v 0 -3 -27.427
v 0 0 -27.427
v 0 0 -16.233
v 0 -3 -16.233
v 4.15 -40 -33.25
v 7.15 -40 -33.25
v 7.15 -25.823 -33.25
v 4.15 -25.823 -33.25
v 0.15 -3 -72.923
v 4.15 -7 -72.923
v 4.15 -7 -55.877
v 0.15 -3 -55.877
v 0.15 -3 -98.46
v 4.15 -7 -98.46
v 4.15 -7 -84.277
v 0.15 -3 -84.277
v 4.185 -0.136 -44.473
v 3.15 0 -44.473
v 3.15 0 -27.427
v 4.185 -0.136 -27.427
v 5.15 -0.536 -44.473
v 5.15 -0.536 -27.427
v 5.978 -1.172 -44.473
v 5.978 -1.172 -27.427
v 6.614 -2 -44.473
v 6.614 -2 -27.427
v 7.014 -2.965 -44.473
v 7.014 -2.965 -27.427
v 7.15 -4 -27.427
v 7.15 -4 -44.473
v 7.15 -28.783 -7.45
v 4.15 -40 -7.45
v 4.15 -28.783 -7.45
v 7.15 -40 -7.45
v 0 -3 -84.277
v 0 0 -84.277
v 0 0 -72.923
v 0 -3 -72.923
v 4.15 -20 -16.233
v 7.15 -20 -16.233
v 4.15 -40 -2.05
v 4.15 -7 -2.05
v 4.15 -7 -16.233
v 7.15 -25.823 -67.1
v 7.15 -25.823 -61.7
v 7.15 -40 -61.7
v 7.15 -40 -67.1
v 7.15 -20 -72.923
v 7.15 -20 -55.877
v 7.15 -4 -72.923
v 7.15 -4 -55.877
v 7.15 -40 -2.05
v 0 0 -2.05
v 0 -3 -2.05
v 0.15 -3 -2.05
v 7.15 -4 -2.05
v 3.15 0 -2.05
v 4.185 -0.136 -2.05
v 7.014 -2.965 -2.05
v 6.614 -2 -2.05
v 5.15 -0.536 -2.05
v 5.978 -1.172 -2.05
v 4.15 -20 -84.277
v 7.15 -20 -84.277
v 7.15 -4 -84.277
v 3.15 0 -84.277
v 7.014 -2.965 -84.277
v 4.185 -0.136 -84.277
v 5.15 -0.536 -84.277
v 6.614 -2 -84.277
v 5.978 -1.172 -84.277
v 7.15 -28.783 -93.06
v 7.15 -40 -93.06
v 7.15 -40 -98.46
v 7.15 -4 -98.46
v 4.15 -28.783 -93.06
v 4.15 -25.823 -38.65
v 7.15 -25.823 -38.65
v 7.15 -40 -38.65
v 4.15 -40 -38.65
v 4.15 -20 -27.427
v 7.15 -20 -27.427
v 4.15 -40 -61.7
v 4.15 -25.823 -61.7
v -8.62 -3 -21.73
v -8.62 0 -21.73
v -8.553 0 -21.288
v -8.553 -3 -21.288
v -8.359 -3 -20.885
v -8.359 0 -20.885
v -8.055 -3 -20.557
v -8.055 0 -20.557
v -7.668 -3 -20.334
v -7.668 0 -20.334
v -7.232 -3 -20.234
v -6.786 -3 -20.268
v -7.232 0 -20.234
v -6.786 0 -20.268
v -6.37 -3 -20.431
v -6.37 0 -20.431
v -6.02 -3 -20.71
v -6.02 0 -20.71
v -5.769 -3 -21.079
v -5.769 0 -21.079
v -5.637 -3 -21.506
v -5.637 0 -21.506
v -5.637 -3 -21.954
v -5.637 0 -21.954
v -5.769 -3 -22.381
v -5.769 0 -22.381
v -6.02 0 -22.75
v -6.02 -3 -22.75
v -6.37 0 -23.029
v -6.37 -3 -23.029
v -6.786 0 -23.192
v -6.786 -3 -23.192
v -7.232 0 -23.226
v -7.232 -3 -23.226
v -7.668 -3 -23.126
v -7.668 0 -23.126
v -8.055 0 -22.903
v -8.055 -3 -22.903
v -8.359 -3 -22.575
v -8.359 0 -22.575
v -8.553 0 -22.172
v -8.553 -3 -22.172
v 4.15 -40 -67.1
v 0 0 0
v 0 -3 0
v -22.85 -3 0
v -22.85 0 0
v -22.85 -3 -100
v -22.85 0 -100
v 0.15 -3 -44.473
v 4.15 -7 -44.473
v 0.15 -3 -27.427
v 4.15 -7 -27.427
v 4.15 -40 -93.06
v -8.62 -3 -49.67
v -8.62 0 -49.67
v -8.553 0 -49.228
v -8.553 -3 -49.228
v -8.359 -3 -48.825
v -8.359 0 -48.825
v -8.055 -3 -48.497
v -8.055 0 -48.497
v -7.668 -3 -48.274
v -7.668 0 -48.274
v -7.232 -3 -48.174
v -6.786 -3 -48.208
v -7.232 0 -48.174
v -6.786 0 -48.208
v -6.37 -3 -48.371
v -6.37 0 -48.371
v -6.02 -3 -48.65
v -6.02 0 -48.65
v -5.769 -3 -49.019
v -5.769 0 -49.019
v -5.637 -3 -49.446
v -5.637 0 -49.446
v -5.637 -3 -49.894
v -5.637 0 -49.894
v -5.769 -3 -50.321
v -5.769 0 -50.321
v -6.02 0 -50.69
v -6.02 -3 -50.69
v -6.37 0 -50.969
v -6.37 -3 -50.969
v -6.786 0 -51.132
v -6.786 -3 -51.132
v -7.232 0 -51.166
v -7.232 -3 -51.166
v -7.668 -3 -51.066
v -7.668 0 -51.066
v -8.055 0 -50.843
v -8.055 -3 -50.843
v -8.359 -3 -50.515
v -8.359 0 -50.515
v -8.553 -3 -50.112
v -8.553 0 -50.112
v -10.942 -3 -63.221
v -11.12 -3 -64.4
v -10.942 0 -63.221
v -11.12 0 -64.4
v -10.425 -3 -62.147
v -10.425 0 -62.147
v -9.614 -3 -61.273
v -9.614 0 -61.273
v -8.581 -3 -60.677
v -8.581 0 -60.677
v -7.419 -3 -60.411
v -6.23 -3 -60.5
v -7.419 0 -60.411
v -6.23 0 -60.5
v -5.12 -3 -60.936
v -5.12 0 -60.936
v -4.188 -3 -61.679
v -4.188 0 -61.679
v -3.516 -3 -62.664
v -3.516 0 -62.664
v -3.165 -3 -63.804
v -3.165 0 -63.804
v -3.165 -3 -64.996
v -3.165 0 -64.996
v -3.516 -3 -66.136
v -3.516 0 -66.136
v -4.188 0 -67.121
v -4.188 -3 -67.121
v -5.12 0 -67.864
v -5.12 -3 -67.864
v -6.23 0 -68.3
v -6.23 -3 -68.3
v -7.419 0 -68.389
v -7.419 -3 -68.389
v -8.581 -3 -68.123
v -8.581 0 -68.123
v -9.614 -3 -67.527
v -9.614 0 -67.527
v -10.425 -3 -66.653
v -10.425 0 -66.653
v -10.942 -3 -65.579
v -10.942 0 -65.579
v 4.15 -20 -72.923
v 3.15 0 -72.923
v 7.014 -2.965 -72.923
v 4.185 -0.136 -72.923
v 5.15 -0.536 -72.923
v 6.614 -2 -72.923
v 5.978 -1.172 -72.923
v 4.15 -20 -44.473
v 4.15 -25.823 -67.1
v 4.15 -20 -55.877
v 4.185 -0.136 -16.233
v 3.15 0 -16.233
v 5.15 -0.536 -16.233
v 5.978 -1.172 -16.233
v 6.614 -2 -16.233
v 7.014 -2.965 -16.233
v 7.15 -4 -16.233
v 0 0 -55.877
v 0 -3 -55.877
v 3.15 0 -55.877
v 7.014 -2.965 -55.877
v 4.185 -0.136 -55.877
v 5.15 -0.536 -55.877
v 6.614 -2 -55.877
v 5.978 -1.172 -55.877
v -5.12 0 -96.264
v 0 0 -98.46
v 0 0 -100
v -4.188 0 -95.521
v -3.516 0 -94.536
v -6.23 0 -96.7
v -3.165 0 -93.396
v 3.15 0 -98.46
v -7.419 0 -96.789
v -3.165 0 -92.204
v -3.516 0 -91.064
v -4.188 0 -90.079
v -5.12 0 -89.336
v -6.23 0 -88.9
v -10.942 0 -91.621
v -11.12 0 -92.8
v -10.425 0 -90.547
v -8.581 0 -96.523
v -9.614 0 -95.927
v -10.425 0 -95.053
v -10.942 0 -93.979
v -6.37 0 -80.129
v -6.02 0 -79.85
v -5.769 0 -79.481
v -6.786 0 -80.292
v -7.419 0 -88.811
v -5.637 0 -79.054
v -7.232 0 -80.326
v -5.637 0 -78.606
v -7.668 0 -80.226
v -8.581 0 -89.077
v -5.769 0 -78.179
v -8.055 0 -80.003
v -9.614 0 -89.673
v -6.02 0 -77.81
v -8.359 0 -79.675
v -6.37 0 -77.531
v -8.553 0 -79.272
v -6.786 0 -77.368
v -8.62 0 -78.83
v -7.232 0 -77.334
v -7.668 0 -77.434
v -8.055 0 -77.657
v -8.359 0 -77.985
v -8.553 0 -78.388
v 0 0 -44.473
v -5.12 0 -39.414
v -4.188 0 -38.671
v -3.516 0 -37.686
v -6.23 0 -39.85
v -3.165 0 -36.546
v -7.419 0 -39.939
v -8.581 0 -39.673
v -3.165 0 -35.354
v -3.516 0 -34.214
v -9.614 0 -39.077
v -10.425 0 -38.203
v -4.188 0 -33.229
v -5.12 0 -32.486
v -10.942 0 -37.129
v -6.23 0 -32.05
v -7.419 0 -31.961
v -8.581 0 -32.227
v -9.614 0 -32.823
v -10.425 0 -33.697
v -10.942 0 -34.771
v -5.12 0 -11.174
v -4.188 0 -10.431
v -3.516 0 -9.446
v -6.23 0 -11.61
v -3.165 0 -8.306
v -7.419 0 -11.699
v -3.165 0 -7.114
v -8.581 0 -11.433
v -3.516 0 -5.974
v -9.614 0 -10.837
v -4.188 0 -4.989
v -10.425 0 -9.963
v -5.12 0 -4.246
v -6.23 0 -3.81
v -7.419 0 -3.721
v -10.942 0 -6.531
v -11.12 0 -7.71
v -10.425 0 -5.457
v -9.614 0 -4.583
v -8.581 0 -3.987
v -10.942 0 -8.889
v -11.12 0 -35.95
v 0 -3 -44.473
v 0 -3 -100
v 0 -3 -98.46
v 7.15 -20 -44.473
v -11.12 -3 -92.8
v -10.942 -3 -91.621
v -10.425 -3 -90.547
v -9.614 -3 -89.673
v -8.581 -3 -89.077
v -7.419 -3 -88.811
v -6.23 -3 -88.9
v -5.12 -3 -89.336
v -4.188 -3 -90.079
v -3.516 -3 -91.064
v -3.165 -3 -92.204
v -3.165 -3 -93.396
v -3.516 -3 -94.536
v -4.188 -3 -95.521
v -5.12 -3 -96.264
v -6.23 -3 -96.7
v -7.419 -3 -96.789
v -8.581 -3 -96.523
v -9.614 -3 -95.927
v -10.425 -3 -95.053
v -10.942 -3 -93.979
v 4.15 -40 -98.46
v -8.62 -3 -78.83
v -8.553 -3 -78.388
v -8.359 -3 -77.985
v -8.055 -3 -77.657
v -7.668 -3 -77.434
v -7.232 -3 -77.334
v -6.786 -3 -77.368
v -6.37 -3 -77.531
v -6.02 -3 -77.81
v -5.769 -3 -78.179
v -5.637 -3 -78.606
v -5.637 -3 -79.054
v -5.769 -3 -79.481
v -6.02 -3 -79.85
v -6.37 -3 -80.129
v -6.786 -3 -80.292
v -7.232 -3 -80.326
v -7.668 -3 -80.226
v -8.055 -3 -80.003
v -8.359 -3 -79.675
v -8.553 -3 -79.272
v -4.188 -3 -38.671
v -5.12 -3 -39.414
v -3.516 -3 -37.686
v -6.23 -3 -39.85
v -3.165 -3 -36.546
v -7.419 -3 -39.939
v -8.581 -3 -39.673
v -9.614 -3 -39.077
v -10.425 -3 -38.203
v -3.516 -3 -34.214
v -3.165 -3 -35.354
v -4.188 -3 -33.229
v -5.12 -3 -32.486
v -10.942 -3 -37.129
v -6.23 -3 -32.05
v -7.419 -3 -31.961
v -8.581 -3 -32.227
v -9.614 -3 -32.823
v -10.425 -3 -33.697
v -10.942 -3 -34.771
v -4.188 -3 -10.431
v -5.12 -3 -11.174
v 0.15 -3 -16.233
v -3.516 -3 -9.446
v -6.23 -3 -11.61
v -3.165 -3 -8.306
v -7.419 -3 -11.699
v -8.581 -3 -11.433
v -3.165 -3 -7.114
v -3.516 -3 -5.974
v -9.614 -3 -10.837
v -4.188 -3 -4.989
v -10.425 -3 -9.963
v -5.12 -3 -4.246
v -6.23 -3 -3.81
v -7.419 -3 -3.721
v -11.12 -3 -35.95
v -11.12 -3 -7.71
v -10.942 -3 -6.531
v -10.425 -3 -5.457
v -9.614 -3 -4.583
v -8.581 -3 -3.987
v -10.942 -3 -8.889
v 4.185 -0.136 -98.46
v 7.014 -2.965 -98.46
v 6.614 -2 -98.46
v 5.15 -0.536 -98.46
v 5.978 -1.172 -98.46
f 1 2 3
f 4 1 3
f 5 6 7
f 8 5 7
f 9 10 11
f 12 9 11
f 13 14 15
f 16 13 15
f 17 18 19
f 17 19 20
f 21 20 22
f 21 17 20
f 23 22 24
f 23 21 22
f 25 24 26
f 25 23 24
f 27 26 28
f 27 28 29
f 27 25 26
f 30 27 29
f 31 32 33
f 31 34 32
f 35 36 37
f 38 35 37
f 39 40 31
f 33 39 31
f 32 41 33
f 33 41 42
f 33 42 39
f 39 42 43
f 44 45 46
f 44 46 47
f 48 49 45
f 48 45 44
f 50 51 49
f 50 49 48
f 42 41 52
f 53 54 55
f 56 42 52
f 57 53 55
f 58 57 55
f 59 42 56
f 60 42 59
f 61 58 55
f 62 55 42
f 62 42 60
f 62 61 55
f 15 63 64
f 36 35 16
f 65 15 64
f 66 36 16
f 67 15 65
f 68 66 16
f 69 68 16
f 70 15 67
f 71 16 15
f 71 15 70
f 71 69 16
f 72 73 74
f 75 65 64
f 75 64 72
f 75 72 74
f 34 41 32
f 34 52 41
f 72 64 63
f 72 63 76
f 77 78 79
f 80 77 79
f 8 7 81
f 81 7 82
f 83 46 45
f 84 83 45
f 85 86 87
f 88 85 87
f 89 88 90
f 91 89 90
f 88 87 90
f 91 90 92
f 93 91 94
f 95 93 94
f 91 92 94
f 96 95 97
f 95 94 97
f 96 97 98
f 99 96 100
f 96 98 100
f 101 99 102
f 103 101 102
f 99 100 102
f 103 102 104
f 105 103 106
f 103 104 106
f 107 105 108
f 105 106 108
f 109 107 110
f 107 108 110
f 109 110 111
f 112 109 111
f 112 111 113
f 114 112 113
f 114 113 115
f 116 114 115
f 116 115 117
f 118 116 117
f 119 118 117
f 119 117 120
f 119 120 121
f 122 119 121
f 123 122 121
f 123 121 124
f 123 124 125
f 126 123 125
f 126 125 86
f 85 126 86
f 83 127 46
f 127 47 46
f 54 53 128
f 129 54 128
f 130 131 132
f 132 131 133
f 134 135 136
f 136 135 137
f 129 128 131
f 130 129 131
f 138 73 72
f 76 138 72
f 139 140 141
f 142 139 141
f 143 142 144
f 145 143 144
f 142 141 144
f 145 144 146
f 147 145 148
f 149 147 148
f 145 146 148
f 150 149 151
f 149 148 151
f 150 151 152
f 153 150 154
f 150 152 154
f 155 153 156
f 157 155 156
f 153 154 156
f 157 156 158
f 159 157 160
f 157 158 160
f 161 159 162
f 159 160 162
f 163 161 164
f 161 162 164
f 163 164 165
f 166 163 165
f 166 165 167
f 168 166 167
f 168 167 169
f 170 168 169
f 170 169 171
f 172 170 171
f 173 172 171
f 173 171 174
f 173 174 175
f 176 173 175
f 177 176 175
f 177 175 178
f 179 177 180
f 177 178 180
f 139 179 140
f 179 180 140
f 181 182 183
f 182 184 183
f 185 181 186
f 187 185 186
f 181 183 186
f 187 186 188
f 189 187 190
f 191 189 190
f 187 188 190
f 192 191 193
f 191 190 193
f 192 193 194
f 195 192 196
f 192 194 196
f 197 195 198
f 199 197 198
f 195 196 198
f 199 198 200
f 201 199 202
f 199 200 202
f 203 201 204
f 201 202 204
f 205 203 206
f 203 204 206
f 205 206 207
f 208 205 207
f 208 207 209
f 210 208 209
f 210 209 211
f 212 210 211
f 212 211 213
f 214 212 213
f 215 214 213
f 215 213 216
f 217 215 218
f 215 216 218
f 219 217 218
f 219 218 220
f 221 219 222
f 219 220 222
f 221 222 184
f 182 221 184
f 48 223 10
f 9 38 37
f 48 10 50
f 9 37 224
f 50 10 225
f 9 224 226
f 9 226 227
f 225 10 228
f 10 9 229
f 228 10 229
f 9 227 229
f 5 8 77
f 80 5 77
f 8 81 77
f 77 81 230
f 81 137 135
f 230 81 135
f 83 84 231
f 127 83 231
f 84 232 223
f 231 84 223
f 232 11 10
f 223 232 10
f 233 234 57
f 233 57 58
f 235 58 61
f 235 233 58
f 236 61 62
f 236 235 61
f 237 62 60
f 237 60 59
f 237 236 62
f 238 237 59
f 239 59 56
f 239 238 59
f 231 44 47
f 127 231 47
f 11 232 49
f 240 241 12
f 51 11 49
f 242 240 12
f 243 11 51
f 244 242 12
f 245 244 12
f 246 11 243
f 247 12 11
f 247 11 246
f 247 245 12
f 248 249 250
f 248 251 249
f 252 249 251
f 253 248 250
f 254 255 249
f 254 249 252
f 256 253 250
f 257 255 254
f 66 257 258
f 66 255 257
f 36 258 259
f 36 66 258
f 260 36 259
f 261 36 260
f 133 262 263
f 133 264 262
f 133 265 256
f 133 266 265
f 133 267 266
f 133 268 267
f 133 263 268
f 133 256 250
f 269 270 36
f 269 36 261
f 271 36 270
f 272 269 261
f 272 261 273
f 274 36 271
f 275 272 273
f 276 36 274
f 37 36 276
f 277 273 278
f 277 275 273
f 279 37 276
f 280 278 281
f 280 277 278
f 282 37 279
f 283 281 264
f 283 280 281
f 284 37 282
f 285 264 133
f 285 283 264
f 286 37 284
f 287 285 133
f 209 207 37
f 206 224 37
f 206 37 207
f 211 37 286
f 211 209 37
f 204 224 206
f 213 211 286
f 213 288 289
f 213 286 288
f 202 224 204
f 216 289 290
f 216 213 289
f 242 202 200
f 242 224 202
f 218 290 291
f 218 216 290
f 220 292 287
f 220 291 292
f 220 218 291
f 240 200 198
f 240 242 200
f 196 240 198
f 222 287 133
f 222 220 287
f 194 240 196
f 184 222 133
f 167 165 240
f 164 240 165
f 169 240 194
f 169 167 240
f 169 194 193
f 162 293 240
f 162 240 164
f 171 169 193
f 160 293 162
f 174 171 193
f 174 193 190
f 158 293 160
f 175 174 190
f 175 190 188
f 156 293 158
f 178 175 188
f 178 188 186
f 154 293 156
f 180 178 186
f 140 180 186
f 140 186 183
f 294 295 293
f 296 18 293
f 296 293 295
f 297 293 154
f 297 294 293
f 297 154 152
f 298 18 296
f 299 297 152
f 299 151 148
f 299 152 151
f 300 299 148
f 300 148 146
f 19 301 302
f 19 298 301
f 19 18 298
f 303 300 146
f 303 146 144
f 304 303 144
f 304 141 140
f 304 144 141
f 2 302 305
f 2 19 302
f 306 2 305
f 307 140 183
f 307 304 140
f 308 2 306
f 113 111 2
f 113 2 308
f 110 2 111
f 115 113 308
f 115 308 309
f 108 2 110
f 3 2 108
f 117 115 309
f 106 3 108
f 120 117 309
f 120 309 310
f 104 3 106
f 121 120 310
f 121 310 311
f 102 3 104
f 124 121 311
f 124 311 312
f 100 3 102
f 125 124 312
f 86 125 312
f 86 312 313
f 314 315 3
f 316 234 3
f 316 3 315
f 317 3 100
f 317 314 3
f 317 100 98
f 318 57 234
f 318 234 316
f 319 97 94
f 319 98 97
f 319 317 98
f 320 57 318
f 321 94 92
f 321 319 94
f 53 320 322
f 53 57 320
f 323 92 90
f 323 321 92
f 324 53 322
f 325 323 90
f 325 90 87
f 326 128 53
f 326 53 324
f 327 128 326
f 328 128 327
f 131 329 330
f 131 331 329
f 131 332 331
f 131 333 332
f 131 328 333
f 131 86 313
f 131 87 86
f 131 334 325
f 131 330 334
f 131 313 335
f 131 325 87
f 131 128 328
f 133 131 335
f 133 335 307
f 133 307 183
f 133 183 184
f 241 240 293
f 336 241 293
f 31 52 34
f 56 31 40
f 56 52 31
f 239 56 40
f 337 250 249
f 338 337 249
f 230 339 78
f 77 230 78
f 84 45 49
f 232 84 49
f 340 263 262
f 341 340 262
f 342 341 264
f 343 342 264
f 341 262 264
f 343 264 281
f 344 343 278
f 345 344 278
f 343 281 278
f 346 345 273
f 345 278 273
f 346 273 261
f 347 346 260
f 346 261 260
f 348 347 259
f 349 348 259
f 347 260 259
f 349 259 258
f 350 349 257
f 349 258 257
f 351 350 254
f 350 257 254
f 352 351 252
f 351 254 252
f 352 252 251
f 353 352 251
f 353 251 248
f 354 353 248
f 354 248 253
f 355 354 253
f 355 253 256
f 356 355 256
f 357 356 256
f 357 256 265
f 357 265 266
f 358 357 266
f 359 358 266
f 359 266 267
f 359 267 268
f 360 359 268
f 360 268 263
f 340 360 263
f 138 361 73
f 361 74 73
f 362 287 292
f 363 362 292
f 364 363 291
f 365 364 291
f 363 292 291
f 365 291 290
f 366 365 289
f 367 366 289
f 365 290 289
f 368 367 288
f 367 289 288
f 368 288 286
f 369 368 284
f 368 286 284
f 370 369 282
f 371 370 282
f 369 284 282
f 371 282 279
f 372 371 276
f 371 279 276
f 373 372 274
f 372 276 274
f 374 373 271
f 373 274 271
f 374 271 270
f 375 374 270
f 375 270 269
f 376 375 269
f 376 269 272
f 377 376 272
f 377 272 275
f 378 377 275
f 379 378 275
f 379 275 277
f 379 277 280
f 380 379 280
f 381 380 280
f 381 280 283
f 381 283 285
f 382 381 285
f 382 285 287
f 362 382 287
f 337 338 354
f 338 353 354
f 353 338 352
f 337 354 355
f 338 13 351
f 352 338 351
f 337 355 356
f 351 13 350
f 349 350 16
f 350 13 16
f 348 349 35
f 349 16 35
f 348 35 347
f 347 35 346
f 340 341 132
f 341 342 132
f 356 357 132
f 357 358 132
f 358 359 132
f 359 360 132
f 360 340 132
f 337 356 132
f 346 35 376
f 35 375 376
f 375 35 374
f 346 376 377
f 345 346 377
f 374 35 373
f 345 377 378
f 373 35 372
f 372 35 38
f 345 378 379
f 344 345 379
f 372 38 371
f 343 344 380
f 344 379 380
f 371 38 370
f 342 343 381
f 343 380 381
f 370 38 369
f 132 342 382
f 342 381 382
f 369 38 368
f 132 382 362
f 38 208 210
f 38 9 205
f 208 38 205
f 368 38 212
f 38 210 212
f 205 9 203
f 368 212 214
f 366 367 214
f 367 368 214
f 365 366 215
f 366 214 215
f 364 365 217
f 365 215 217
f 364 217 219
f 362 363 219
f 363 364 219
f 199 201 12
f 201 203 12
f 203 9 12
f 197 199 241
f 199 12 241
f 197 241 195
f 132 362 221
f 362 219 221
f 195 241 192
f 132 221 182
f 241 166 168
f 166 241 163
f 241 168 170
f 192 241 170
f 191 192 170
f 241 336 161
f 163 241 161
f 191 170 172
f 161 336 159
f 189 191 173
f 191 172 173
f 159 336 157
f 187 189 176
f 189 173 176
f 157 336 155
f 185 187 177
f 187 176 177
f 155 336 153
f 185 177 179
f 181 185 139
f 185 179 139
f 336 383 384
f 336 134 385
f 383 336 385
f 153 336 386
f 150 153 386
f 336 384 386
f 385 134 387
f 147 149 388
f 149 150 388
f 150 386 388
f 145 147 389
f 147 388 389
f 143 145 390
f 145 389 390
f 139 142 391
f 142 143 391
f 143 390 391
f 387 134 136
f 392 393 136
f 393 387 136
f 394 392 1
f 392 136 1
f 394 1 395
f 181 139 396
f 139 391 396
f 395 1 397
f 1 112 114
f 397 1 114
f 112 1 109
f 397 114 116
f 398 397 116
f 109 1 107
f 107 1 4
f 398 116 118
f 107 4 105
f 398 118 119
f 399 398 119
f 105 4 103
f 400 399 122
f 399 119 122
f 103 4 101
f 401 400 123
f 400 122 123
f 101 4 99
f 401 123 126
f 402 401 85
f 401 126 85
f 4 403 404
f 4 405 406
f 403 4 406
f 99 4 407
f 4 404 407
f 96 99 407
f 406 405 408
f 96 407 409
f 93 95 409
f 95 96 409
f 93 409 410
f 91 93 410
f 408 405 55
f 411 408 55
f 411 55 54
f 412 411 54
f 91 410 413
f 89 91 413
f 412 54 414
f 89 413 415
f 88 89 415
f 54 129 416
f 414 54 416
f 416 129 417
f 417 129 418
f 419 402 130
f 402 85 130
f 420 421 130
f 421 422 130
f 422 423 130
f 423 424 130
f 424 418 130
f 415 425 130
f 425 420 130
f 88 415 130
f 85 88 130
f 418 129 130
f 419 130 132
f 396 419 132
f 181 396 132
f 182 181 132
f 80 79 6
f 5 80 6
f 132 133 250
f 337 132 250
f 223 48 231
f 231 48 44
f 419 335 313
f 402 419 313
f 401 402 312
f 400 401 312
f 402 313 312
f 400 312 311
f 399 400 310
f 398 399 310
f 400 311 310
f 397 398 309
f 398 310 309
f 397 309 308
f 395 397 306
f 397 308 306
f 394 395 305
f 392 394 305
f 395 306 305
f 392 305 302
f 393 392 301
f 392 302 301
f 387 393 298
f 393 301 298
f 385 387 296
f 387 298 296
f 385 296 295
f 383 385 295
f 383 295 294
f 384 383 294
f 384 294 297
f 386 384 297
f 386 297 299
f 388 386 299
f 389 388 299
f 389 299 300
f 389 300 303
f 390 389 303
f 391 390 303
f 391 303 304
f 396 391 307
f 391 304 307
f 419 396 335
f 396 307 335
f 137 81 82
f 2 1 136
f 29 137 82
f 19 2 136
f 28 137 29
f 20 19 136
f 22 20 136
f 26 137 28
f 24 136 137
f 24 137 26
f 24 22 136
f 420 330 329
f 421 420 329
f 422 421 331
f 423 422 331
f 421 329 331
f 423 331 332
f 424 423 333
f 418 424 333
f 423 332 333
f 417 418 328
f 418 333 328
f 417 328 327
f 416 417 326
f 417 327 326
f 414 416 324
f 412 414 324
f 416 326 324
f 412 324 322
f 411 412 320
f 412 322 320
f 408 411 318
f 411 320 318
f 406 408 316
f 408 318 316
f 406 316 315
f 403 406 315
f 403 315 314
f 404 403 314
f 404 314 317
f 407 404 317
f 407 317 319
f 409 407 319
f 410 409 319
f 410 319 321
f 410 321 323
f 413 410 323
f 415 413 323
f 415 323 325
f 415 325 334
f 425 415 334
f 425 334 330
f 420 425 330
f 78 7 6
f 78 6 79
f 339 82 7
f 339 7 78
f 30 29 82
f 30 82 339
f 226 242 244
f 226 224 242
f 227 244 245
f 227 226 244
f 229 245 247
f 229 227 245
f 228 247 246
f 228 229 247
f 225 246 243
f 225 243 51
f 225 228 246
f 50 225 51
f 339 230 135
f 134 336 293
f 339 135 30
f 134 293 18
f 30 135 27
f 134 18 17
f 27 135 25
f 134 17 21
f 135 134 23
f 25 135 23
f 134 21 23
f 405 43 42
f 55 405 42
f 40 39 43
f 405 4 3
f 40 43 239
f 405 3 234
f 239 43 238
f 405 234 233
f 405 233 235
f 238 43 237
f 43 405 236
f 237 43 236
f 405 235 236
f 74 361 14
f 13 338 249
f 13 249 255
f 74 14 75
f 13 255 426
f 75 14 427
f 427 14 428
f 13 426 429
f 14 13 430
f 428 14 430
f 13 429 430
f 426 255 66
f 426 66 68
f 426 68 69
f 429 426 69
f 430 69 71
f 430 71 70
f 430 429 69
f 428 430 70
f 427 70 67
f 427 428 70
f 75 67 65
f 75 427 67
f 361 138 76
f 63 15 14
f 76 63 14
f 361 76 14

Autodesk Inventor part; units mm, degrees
ref_plane "YZ Plane" through (0, 0, 0) normal (1, 0, 0) x (0, 1, 0)
sketch "Sketch1" plane through (0, 0, 0) normal (0, 1, 0) x (-1, 0, 0)
  line L0 (0, 0) -> (22.85, 0)
  line L1 (22.85, 0) -> (22.85, -100)
  line L2 (22.85, -100) -> (0, -100)
  line L3 (0, -100) -> (0, 0)
  circle A0 centre (7.12, -92.8) radius 4
  circle A1 centre (7.12, -64.4) radius 4
  circle A2 centre (7.12, -35.95) radius 4
  circle A3 centre (7.12, -7.71) radius 4
  circle A4 centre (7.12, -21.73) radius 1.5
  circle A5 centre (7.12, -49.67) radius 1.5
  circle A6 centre (7.12, -78.83) radius 1.5
  line L4 (7.12, -7.71) -> (-9.9799, -7.71) construction
  line L5 (7.12, -35.95) -> (-7.15, -35.95) construction
  line L6 (7.12, -64.4) -> (-7.15, -64.4) construction
  line L7 (7.12, -92.8) -> (-7.15, -92.8) construction
  line L8 (0, -27.427) -> (-7.15, -27.427)
  line L9 (0, -44.473) -> (-7.15, -44.473)
  line L10 (0, -55.877) -> (-7.15, -55.877)
  line L11 (0, -72.923) -> (-7.15, -72.923)
  line L12 (0, -84.277) -> (-7.15, -84.277)
  line L13 (0, -98.46) -> (-7.15, -98.46)
  line L14 (0, -2.05) -> (-7.15, -2.05)
  line L15 (0, -16.233) -> (-7.15, -16.233)
  line L16 (-7.15, -2.05) -> (-7.15, -16.233)
  line L17 (-7.15, -27.427) -> (-7.15, -44.473)
  line L18 (-7.15, -55.877) -> (-7.15, -72.923)
  line L19 (-7.15, -84.277) -> (-7.15, -98.46)
  line L20 (-7.15, 0) -> (-7.15, -100) construction
  dimension "d0" = 22.85
  dimension "d1" = 100
  dimension "d2" = 8
  dimension "d3" = 8
  dimension "d4" = 8
  dimension "d5" = 8
  dimension "d7" = 0
  dimension "d8" = 0
  dimension "d9" = 0
  dimension "d10" = 7.71
  dimension "d11" = 35.95
  dimension "d12" = 64.4
  dimension "d13" = 92.8
  dimension "d14" = 3
  dimension "d15" = 3
  dimension "d16" = 3
  dimension "d17" = 7.12
  dimension "d18" = 7.12
  dimension "d19" = 0
  dimension "d20" = 0
  dimension "d21" = 21.73
  dimension "d22" = 49.67
  dimension "d23" = 78.83
  dimension "d28" = 8.523
  dimension "d29" = 8.523
  dimension "d30" = 8.523
  dimension "d31" = 8.523
  dimension "d32" = 8.523
  dimension "d33" = 5.66
  dimension "d34" = 5.66
  dimension "d35" = 8.523
  dimension "d36" = 100
  dimension "d42" = 7.15
extrude "Extrusion1" add sketch "Sketch1" against normal blind 3
ref_plane "Work Plane2" through (7.15, 0, -16.233) normal (1, 0, 0) x (0, 0, -1)
ref_plane "Work Plane3" through (7.15, 0, -2.05) normal (1, 0, 0) x (0, 0, -1)
sketch "Sketch3" plane through (7.15, 0, -2.05) normal (1, 0, 0) x (0, 0, -1)
  line L0 (0, 0) -> (14.183, 0) projected
  line L1 (14.183, -3) -> (0, -3) projected
  line L2 (14.183, 0) -> (14.183, -3) projected
  line L3 (0, 0) -> (0, -3) projected
  line L4 (25.377, 0) -> (42.423, 0) projected
  line L5 (25.377, 0) -> (25.377, -3) projected
  line L6 (42.423, -3) -> (25.377, -3) projected
  line L7 (42.423, 0) -> (42.423, -3) projected
  line L8 (53.827, 0) -> (70.873, 0) projected
  line L9 (53.827, 0) -> (53.827, -3) projected
  line L10 (70.873, -3) -> (53.827, -3) projected
  line L11 (70.873, 0) -> (70.873, -3) projected
  line L12 (82.227, 0) -> (96.41, 0) projected
  line L13 (82.227, 0) -> (82.227, -3) projected
  line L14 (96.41, -3) -> (82.227, -3) projected
  line L15 (96.41, 0) -> (96.41, -3) projected
  line L16 (0, 0) -> (0, -40)
  line L17 (0, -40) -> (5.4, -40)
  line L18 (14.183, 0) -> (14.183, -20)
  line L19 (5.4, -40) -> (5.4, -28.783)
  line L20 (14.183, -20) -> (5.4, -28.783)
  line L21 (96.41, 0) -> (96.41, -40)
  line L22 (96.41, -40) -> (91.01, -40)
  line L23 (82.227, 0) -> (82.227, -20)
  line L24 (91.01, -40) -> (91.01, -28.783)
  line L25 (82.227, -20) -> (91.01, -28.783)
  line L26 (70.873, 0) -> (70.873, -20)
  line L27 (53.827, 0) -> (53.827, -20)
  line L28 (70.873, -20) -> (65.05, -25.823)
  line L29 (65.05, -25.823) -> (65.05, -40)
  line L30 (65.05, -40) -> (59.65, -40)
  line L31 (59.65, -40) -> (59.65, -25.823)
  line L32 (59.65, -25.823) -> (53.827, -20)
  line L33 (62.35, -40) -> (62.35, 0) construction
  line L34 (53.827, 0) -> (70.873, 0) projected
  line L35 (42.423, 0) -> (42.423, -20)
  line L36 (25.377, 0) -> (25.377, -20)
  line L37 (42.423, -20) -> (36.6, -25.823)
  line L38 (36.6, -25.823) -> (36.6, -40)
  line L39 (36.6, -40) -> (31.2, -40)
  line L40 (31.2, -40) -> (31.2, -25.823)
  line L41 (31.2, -25.823) -> (25.377, -20)
  line L42 (33.9, -40) -> (33.9, 0) construction
  point P0 (82.227, -3)
  dimension "d46" = 40
  dimension "d47" = 5.4
  dimension "d48" = 20
  dimension "d51" = 135
  dimension "d56" = 135
  dimension "d57" = 5.4
  dimension "d58" = 40
  dimension "d59" = 20
  dimension "d61" = 20
  dimension "d62" = 135
  dimension "d63" = 135
  dimension "d64" = 5.4
  dimension "d66" = 20
  dimension "d67" = 20
  dimension "d68" = 135
  dimension "d69" = 135
  dimension "d70" = 5.4
  dimension "d71" = 20
extrude "Extrusion2" add sketch "Sketch3" against normal blind 3
fillet "Fillet1" radius 4 4 edges at (7.15, 0, -9.1415) (7.15, 0, -35.95) (7.15, 0, -64.4) (7.15, 0, -91.3685)
chamfer "Chamfer1" distance 4 angle 45 4 edges at (4.15, -3, -9.1415) (4.15, -3, -35.95) (4.15, -3, -64.4) (4.15, -3, -91.3685)
equation "\"d18\" = d17"
equation "\"d57\" = d47"
equation "\"d58\" = d46"
equation "\"d59\" = d48"
properties part number "suporte 555"
